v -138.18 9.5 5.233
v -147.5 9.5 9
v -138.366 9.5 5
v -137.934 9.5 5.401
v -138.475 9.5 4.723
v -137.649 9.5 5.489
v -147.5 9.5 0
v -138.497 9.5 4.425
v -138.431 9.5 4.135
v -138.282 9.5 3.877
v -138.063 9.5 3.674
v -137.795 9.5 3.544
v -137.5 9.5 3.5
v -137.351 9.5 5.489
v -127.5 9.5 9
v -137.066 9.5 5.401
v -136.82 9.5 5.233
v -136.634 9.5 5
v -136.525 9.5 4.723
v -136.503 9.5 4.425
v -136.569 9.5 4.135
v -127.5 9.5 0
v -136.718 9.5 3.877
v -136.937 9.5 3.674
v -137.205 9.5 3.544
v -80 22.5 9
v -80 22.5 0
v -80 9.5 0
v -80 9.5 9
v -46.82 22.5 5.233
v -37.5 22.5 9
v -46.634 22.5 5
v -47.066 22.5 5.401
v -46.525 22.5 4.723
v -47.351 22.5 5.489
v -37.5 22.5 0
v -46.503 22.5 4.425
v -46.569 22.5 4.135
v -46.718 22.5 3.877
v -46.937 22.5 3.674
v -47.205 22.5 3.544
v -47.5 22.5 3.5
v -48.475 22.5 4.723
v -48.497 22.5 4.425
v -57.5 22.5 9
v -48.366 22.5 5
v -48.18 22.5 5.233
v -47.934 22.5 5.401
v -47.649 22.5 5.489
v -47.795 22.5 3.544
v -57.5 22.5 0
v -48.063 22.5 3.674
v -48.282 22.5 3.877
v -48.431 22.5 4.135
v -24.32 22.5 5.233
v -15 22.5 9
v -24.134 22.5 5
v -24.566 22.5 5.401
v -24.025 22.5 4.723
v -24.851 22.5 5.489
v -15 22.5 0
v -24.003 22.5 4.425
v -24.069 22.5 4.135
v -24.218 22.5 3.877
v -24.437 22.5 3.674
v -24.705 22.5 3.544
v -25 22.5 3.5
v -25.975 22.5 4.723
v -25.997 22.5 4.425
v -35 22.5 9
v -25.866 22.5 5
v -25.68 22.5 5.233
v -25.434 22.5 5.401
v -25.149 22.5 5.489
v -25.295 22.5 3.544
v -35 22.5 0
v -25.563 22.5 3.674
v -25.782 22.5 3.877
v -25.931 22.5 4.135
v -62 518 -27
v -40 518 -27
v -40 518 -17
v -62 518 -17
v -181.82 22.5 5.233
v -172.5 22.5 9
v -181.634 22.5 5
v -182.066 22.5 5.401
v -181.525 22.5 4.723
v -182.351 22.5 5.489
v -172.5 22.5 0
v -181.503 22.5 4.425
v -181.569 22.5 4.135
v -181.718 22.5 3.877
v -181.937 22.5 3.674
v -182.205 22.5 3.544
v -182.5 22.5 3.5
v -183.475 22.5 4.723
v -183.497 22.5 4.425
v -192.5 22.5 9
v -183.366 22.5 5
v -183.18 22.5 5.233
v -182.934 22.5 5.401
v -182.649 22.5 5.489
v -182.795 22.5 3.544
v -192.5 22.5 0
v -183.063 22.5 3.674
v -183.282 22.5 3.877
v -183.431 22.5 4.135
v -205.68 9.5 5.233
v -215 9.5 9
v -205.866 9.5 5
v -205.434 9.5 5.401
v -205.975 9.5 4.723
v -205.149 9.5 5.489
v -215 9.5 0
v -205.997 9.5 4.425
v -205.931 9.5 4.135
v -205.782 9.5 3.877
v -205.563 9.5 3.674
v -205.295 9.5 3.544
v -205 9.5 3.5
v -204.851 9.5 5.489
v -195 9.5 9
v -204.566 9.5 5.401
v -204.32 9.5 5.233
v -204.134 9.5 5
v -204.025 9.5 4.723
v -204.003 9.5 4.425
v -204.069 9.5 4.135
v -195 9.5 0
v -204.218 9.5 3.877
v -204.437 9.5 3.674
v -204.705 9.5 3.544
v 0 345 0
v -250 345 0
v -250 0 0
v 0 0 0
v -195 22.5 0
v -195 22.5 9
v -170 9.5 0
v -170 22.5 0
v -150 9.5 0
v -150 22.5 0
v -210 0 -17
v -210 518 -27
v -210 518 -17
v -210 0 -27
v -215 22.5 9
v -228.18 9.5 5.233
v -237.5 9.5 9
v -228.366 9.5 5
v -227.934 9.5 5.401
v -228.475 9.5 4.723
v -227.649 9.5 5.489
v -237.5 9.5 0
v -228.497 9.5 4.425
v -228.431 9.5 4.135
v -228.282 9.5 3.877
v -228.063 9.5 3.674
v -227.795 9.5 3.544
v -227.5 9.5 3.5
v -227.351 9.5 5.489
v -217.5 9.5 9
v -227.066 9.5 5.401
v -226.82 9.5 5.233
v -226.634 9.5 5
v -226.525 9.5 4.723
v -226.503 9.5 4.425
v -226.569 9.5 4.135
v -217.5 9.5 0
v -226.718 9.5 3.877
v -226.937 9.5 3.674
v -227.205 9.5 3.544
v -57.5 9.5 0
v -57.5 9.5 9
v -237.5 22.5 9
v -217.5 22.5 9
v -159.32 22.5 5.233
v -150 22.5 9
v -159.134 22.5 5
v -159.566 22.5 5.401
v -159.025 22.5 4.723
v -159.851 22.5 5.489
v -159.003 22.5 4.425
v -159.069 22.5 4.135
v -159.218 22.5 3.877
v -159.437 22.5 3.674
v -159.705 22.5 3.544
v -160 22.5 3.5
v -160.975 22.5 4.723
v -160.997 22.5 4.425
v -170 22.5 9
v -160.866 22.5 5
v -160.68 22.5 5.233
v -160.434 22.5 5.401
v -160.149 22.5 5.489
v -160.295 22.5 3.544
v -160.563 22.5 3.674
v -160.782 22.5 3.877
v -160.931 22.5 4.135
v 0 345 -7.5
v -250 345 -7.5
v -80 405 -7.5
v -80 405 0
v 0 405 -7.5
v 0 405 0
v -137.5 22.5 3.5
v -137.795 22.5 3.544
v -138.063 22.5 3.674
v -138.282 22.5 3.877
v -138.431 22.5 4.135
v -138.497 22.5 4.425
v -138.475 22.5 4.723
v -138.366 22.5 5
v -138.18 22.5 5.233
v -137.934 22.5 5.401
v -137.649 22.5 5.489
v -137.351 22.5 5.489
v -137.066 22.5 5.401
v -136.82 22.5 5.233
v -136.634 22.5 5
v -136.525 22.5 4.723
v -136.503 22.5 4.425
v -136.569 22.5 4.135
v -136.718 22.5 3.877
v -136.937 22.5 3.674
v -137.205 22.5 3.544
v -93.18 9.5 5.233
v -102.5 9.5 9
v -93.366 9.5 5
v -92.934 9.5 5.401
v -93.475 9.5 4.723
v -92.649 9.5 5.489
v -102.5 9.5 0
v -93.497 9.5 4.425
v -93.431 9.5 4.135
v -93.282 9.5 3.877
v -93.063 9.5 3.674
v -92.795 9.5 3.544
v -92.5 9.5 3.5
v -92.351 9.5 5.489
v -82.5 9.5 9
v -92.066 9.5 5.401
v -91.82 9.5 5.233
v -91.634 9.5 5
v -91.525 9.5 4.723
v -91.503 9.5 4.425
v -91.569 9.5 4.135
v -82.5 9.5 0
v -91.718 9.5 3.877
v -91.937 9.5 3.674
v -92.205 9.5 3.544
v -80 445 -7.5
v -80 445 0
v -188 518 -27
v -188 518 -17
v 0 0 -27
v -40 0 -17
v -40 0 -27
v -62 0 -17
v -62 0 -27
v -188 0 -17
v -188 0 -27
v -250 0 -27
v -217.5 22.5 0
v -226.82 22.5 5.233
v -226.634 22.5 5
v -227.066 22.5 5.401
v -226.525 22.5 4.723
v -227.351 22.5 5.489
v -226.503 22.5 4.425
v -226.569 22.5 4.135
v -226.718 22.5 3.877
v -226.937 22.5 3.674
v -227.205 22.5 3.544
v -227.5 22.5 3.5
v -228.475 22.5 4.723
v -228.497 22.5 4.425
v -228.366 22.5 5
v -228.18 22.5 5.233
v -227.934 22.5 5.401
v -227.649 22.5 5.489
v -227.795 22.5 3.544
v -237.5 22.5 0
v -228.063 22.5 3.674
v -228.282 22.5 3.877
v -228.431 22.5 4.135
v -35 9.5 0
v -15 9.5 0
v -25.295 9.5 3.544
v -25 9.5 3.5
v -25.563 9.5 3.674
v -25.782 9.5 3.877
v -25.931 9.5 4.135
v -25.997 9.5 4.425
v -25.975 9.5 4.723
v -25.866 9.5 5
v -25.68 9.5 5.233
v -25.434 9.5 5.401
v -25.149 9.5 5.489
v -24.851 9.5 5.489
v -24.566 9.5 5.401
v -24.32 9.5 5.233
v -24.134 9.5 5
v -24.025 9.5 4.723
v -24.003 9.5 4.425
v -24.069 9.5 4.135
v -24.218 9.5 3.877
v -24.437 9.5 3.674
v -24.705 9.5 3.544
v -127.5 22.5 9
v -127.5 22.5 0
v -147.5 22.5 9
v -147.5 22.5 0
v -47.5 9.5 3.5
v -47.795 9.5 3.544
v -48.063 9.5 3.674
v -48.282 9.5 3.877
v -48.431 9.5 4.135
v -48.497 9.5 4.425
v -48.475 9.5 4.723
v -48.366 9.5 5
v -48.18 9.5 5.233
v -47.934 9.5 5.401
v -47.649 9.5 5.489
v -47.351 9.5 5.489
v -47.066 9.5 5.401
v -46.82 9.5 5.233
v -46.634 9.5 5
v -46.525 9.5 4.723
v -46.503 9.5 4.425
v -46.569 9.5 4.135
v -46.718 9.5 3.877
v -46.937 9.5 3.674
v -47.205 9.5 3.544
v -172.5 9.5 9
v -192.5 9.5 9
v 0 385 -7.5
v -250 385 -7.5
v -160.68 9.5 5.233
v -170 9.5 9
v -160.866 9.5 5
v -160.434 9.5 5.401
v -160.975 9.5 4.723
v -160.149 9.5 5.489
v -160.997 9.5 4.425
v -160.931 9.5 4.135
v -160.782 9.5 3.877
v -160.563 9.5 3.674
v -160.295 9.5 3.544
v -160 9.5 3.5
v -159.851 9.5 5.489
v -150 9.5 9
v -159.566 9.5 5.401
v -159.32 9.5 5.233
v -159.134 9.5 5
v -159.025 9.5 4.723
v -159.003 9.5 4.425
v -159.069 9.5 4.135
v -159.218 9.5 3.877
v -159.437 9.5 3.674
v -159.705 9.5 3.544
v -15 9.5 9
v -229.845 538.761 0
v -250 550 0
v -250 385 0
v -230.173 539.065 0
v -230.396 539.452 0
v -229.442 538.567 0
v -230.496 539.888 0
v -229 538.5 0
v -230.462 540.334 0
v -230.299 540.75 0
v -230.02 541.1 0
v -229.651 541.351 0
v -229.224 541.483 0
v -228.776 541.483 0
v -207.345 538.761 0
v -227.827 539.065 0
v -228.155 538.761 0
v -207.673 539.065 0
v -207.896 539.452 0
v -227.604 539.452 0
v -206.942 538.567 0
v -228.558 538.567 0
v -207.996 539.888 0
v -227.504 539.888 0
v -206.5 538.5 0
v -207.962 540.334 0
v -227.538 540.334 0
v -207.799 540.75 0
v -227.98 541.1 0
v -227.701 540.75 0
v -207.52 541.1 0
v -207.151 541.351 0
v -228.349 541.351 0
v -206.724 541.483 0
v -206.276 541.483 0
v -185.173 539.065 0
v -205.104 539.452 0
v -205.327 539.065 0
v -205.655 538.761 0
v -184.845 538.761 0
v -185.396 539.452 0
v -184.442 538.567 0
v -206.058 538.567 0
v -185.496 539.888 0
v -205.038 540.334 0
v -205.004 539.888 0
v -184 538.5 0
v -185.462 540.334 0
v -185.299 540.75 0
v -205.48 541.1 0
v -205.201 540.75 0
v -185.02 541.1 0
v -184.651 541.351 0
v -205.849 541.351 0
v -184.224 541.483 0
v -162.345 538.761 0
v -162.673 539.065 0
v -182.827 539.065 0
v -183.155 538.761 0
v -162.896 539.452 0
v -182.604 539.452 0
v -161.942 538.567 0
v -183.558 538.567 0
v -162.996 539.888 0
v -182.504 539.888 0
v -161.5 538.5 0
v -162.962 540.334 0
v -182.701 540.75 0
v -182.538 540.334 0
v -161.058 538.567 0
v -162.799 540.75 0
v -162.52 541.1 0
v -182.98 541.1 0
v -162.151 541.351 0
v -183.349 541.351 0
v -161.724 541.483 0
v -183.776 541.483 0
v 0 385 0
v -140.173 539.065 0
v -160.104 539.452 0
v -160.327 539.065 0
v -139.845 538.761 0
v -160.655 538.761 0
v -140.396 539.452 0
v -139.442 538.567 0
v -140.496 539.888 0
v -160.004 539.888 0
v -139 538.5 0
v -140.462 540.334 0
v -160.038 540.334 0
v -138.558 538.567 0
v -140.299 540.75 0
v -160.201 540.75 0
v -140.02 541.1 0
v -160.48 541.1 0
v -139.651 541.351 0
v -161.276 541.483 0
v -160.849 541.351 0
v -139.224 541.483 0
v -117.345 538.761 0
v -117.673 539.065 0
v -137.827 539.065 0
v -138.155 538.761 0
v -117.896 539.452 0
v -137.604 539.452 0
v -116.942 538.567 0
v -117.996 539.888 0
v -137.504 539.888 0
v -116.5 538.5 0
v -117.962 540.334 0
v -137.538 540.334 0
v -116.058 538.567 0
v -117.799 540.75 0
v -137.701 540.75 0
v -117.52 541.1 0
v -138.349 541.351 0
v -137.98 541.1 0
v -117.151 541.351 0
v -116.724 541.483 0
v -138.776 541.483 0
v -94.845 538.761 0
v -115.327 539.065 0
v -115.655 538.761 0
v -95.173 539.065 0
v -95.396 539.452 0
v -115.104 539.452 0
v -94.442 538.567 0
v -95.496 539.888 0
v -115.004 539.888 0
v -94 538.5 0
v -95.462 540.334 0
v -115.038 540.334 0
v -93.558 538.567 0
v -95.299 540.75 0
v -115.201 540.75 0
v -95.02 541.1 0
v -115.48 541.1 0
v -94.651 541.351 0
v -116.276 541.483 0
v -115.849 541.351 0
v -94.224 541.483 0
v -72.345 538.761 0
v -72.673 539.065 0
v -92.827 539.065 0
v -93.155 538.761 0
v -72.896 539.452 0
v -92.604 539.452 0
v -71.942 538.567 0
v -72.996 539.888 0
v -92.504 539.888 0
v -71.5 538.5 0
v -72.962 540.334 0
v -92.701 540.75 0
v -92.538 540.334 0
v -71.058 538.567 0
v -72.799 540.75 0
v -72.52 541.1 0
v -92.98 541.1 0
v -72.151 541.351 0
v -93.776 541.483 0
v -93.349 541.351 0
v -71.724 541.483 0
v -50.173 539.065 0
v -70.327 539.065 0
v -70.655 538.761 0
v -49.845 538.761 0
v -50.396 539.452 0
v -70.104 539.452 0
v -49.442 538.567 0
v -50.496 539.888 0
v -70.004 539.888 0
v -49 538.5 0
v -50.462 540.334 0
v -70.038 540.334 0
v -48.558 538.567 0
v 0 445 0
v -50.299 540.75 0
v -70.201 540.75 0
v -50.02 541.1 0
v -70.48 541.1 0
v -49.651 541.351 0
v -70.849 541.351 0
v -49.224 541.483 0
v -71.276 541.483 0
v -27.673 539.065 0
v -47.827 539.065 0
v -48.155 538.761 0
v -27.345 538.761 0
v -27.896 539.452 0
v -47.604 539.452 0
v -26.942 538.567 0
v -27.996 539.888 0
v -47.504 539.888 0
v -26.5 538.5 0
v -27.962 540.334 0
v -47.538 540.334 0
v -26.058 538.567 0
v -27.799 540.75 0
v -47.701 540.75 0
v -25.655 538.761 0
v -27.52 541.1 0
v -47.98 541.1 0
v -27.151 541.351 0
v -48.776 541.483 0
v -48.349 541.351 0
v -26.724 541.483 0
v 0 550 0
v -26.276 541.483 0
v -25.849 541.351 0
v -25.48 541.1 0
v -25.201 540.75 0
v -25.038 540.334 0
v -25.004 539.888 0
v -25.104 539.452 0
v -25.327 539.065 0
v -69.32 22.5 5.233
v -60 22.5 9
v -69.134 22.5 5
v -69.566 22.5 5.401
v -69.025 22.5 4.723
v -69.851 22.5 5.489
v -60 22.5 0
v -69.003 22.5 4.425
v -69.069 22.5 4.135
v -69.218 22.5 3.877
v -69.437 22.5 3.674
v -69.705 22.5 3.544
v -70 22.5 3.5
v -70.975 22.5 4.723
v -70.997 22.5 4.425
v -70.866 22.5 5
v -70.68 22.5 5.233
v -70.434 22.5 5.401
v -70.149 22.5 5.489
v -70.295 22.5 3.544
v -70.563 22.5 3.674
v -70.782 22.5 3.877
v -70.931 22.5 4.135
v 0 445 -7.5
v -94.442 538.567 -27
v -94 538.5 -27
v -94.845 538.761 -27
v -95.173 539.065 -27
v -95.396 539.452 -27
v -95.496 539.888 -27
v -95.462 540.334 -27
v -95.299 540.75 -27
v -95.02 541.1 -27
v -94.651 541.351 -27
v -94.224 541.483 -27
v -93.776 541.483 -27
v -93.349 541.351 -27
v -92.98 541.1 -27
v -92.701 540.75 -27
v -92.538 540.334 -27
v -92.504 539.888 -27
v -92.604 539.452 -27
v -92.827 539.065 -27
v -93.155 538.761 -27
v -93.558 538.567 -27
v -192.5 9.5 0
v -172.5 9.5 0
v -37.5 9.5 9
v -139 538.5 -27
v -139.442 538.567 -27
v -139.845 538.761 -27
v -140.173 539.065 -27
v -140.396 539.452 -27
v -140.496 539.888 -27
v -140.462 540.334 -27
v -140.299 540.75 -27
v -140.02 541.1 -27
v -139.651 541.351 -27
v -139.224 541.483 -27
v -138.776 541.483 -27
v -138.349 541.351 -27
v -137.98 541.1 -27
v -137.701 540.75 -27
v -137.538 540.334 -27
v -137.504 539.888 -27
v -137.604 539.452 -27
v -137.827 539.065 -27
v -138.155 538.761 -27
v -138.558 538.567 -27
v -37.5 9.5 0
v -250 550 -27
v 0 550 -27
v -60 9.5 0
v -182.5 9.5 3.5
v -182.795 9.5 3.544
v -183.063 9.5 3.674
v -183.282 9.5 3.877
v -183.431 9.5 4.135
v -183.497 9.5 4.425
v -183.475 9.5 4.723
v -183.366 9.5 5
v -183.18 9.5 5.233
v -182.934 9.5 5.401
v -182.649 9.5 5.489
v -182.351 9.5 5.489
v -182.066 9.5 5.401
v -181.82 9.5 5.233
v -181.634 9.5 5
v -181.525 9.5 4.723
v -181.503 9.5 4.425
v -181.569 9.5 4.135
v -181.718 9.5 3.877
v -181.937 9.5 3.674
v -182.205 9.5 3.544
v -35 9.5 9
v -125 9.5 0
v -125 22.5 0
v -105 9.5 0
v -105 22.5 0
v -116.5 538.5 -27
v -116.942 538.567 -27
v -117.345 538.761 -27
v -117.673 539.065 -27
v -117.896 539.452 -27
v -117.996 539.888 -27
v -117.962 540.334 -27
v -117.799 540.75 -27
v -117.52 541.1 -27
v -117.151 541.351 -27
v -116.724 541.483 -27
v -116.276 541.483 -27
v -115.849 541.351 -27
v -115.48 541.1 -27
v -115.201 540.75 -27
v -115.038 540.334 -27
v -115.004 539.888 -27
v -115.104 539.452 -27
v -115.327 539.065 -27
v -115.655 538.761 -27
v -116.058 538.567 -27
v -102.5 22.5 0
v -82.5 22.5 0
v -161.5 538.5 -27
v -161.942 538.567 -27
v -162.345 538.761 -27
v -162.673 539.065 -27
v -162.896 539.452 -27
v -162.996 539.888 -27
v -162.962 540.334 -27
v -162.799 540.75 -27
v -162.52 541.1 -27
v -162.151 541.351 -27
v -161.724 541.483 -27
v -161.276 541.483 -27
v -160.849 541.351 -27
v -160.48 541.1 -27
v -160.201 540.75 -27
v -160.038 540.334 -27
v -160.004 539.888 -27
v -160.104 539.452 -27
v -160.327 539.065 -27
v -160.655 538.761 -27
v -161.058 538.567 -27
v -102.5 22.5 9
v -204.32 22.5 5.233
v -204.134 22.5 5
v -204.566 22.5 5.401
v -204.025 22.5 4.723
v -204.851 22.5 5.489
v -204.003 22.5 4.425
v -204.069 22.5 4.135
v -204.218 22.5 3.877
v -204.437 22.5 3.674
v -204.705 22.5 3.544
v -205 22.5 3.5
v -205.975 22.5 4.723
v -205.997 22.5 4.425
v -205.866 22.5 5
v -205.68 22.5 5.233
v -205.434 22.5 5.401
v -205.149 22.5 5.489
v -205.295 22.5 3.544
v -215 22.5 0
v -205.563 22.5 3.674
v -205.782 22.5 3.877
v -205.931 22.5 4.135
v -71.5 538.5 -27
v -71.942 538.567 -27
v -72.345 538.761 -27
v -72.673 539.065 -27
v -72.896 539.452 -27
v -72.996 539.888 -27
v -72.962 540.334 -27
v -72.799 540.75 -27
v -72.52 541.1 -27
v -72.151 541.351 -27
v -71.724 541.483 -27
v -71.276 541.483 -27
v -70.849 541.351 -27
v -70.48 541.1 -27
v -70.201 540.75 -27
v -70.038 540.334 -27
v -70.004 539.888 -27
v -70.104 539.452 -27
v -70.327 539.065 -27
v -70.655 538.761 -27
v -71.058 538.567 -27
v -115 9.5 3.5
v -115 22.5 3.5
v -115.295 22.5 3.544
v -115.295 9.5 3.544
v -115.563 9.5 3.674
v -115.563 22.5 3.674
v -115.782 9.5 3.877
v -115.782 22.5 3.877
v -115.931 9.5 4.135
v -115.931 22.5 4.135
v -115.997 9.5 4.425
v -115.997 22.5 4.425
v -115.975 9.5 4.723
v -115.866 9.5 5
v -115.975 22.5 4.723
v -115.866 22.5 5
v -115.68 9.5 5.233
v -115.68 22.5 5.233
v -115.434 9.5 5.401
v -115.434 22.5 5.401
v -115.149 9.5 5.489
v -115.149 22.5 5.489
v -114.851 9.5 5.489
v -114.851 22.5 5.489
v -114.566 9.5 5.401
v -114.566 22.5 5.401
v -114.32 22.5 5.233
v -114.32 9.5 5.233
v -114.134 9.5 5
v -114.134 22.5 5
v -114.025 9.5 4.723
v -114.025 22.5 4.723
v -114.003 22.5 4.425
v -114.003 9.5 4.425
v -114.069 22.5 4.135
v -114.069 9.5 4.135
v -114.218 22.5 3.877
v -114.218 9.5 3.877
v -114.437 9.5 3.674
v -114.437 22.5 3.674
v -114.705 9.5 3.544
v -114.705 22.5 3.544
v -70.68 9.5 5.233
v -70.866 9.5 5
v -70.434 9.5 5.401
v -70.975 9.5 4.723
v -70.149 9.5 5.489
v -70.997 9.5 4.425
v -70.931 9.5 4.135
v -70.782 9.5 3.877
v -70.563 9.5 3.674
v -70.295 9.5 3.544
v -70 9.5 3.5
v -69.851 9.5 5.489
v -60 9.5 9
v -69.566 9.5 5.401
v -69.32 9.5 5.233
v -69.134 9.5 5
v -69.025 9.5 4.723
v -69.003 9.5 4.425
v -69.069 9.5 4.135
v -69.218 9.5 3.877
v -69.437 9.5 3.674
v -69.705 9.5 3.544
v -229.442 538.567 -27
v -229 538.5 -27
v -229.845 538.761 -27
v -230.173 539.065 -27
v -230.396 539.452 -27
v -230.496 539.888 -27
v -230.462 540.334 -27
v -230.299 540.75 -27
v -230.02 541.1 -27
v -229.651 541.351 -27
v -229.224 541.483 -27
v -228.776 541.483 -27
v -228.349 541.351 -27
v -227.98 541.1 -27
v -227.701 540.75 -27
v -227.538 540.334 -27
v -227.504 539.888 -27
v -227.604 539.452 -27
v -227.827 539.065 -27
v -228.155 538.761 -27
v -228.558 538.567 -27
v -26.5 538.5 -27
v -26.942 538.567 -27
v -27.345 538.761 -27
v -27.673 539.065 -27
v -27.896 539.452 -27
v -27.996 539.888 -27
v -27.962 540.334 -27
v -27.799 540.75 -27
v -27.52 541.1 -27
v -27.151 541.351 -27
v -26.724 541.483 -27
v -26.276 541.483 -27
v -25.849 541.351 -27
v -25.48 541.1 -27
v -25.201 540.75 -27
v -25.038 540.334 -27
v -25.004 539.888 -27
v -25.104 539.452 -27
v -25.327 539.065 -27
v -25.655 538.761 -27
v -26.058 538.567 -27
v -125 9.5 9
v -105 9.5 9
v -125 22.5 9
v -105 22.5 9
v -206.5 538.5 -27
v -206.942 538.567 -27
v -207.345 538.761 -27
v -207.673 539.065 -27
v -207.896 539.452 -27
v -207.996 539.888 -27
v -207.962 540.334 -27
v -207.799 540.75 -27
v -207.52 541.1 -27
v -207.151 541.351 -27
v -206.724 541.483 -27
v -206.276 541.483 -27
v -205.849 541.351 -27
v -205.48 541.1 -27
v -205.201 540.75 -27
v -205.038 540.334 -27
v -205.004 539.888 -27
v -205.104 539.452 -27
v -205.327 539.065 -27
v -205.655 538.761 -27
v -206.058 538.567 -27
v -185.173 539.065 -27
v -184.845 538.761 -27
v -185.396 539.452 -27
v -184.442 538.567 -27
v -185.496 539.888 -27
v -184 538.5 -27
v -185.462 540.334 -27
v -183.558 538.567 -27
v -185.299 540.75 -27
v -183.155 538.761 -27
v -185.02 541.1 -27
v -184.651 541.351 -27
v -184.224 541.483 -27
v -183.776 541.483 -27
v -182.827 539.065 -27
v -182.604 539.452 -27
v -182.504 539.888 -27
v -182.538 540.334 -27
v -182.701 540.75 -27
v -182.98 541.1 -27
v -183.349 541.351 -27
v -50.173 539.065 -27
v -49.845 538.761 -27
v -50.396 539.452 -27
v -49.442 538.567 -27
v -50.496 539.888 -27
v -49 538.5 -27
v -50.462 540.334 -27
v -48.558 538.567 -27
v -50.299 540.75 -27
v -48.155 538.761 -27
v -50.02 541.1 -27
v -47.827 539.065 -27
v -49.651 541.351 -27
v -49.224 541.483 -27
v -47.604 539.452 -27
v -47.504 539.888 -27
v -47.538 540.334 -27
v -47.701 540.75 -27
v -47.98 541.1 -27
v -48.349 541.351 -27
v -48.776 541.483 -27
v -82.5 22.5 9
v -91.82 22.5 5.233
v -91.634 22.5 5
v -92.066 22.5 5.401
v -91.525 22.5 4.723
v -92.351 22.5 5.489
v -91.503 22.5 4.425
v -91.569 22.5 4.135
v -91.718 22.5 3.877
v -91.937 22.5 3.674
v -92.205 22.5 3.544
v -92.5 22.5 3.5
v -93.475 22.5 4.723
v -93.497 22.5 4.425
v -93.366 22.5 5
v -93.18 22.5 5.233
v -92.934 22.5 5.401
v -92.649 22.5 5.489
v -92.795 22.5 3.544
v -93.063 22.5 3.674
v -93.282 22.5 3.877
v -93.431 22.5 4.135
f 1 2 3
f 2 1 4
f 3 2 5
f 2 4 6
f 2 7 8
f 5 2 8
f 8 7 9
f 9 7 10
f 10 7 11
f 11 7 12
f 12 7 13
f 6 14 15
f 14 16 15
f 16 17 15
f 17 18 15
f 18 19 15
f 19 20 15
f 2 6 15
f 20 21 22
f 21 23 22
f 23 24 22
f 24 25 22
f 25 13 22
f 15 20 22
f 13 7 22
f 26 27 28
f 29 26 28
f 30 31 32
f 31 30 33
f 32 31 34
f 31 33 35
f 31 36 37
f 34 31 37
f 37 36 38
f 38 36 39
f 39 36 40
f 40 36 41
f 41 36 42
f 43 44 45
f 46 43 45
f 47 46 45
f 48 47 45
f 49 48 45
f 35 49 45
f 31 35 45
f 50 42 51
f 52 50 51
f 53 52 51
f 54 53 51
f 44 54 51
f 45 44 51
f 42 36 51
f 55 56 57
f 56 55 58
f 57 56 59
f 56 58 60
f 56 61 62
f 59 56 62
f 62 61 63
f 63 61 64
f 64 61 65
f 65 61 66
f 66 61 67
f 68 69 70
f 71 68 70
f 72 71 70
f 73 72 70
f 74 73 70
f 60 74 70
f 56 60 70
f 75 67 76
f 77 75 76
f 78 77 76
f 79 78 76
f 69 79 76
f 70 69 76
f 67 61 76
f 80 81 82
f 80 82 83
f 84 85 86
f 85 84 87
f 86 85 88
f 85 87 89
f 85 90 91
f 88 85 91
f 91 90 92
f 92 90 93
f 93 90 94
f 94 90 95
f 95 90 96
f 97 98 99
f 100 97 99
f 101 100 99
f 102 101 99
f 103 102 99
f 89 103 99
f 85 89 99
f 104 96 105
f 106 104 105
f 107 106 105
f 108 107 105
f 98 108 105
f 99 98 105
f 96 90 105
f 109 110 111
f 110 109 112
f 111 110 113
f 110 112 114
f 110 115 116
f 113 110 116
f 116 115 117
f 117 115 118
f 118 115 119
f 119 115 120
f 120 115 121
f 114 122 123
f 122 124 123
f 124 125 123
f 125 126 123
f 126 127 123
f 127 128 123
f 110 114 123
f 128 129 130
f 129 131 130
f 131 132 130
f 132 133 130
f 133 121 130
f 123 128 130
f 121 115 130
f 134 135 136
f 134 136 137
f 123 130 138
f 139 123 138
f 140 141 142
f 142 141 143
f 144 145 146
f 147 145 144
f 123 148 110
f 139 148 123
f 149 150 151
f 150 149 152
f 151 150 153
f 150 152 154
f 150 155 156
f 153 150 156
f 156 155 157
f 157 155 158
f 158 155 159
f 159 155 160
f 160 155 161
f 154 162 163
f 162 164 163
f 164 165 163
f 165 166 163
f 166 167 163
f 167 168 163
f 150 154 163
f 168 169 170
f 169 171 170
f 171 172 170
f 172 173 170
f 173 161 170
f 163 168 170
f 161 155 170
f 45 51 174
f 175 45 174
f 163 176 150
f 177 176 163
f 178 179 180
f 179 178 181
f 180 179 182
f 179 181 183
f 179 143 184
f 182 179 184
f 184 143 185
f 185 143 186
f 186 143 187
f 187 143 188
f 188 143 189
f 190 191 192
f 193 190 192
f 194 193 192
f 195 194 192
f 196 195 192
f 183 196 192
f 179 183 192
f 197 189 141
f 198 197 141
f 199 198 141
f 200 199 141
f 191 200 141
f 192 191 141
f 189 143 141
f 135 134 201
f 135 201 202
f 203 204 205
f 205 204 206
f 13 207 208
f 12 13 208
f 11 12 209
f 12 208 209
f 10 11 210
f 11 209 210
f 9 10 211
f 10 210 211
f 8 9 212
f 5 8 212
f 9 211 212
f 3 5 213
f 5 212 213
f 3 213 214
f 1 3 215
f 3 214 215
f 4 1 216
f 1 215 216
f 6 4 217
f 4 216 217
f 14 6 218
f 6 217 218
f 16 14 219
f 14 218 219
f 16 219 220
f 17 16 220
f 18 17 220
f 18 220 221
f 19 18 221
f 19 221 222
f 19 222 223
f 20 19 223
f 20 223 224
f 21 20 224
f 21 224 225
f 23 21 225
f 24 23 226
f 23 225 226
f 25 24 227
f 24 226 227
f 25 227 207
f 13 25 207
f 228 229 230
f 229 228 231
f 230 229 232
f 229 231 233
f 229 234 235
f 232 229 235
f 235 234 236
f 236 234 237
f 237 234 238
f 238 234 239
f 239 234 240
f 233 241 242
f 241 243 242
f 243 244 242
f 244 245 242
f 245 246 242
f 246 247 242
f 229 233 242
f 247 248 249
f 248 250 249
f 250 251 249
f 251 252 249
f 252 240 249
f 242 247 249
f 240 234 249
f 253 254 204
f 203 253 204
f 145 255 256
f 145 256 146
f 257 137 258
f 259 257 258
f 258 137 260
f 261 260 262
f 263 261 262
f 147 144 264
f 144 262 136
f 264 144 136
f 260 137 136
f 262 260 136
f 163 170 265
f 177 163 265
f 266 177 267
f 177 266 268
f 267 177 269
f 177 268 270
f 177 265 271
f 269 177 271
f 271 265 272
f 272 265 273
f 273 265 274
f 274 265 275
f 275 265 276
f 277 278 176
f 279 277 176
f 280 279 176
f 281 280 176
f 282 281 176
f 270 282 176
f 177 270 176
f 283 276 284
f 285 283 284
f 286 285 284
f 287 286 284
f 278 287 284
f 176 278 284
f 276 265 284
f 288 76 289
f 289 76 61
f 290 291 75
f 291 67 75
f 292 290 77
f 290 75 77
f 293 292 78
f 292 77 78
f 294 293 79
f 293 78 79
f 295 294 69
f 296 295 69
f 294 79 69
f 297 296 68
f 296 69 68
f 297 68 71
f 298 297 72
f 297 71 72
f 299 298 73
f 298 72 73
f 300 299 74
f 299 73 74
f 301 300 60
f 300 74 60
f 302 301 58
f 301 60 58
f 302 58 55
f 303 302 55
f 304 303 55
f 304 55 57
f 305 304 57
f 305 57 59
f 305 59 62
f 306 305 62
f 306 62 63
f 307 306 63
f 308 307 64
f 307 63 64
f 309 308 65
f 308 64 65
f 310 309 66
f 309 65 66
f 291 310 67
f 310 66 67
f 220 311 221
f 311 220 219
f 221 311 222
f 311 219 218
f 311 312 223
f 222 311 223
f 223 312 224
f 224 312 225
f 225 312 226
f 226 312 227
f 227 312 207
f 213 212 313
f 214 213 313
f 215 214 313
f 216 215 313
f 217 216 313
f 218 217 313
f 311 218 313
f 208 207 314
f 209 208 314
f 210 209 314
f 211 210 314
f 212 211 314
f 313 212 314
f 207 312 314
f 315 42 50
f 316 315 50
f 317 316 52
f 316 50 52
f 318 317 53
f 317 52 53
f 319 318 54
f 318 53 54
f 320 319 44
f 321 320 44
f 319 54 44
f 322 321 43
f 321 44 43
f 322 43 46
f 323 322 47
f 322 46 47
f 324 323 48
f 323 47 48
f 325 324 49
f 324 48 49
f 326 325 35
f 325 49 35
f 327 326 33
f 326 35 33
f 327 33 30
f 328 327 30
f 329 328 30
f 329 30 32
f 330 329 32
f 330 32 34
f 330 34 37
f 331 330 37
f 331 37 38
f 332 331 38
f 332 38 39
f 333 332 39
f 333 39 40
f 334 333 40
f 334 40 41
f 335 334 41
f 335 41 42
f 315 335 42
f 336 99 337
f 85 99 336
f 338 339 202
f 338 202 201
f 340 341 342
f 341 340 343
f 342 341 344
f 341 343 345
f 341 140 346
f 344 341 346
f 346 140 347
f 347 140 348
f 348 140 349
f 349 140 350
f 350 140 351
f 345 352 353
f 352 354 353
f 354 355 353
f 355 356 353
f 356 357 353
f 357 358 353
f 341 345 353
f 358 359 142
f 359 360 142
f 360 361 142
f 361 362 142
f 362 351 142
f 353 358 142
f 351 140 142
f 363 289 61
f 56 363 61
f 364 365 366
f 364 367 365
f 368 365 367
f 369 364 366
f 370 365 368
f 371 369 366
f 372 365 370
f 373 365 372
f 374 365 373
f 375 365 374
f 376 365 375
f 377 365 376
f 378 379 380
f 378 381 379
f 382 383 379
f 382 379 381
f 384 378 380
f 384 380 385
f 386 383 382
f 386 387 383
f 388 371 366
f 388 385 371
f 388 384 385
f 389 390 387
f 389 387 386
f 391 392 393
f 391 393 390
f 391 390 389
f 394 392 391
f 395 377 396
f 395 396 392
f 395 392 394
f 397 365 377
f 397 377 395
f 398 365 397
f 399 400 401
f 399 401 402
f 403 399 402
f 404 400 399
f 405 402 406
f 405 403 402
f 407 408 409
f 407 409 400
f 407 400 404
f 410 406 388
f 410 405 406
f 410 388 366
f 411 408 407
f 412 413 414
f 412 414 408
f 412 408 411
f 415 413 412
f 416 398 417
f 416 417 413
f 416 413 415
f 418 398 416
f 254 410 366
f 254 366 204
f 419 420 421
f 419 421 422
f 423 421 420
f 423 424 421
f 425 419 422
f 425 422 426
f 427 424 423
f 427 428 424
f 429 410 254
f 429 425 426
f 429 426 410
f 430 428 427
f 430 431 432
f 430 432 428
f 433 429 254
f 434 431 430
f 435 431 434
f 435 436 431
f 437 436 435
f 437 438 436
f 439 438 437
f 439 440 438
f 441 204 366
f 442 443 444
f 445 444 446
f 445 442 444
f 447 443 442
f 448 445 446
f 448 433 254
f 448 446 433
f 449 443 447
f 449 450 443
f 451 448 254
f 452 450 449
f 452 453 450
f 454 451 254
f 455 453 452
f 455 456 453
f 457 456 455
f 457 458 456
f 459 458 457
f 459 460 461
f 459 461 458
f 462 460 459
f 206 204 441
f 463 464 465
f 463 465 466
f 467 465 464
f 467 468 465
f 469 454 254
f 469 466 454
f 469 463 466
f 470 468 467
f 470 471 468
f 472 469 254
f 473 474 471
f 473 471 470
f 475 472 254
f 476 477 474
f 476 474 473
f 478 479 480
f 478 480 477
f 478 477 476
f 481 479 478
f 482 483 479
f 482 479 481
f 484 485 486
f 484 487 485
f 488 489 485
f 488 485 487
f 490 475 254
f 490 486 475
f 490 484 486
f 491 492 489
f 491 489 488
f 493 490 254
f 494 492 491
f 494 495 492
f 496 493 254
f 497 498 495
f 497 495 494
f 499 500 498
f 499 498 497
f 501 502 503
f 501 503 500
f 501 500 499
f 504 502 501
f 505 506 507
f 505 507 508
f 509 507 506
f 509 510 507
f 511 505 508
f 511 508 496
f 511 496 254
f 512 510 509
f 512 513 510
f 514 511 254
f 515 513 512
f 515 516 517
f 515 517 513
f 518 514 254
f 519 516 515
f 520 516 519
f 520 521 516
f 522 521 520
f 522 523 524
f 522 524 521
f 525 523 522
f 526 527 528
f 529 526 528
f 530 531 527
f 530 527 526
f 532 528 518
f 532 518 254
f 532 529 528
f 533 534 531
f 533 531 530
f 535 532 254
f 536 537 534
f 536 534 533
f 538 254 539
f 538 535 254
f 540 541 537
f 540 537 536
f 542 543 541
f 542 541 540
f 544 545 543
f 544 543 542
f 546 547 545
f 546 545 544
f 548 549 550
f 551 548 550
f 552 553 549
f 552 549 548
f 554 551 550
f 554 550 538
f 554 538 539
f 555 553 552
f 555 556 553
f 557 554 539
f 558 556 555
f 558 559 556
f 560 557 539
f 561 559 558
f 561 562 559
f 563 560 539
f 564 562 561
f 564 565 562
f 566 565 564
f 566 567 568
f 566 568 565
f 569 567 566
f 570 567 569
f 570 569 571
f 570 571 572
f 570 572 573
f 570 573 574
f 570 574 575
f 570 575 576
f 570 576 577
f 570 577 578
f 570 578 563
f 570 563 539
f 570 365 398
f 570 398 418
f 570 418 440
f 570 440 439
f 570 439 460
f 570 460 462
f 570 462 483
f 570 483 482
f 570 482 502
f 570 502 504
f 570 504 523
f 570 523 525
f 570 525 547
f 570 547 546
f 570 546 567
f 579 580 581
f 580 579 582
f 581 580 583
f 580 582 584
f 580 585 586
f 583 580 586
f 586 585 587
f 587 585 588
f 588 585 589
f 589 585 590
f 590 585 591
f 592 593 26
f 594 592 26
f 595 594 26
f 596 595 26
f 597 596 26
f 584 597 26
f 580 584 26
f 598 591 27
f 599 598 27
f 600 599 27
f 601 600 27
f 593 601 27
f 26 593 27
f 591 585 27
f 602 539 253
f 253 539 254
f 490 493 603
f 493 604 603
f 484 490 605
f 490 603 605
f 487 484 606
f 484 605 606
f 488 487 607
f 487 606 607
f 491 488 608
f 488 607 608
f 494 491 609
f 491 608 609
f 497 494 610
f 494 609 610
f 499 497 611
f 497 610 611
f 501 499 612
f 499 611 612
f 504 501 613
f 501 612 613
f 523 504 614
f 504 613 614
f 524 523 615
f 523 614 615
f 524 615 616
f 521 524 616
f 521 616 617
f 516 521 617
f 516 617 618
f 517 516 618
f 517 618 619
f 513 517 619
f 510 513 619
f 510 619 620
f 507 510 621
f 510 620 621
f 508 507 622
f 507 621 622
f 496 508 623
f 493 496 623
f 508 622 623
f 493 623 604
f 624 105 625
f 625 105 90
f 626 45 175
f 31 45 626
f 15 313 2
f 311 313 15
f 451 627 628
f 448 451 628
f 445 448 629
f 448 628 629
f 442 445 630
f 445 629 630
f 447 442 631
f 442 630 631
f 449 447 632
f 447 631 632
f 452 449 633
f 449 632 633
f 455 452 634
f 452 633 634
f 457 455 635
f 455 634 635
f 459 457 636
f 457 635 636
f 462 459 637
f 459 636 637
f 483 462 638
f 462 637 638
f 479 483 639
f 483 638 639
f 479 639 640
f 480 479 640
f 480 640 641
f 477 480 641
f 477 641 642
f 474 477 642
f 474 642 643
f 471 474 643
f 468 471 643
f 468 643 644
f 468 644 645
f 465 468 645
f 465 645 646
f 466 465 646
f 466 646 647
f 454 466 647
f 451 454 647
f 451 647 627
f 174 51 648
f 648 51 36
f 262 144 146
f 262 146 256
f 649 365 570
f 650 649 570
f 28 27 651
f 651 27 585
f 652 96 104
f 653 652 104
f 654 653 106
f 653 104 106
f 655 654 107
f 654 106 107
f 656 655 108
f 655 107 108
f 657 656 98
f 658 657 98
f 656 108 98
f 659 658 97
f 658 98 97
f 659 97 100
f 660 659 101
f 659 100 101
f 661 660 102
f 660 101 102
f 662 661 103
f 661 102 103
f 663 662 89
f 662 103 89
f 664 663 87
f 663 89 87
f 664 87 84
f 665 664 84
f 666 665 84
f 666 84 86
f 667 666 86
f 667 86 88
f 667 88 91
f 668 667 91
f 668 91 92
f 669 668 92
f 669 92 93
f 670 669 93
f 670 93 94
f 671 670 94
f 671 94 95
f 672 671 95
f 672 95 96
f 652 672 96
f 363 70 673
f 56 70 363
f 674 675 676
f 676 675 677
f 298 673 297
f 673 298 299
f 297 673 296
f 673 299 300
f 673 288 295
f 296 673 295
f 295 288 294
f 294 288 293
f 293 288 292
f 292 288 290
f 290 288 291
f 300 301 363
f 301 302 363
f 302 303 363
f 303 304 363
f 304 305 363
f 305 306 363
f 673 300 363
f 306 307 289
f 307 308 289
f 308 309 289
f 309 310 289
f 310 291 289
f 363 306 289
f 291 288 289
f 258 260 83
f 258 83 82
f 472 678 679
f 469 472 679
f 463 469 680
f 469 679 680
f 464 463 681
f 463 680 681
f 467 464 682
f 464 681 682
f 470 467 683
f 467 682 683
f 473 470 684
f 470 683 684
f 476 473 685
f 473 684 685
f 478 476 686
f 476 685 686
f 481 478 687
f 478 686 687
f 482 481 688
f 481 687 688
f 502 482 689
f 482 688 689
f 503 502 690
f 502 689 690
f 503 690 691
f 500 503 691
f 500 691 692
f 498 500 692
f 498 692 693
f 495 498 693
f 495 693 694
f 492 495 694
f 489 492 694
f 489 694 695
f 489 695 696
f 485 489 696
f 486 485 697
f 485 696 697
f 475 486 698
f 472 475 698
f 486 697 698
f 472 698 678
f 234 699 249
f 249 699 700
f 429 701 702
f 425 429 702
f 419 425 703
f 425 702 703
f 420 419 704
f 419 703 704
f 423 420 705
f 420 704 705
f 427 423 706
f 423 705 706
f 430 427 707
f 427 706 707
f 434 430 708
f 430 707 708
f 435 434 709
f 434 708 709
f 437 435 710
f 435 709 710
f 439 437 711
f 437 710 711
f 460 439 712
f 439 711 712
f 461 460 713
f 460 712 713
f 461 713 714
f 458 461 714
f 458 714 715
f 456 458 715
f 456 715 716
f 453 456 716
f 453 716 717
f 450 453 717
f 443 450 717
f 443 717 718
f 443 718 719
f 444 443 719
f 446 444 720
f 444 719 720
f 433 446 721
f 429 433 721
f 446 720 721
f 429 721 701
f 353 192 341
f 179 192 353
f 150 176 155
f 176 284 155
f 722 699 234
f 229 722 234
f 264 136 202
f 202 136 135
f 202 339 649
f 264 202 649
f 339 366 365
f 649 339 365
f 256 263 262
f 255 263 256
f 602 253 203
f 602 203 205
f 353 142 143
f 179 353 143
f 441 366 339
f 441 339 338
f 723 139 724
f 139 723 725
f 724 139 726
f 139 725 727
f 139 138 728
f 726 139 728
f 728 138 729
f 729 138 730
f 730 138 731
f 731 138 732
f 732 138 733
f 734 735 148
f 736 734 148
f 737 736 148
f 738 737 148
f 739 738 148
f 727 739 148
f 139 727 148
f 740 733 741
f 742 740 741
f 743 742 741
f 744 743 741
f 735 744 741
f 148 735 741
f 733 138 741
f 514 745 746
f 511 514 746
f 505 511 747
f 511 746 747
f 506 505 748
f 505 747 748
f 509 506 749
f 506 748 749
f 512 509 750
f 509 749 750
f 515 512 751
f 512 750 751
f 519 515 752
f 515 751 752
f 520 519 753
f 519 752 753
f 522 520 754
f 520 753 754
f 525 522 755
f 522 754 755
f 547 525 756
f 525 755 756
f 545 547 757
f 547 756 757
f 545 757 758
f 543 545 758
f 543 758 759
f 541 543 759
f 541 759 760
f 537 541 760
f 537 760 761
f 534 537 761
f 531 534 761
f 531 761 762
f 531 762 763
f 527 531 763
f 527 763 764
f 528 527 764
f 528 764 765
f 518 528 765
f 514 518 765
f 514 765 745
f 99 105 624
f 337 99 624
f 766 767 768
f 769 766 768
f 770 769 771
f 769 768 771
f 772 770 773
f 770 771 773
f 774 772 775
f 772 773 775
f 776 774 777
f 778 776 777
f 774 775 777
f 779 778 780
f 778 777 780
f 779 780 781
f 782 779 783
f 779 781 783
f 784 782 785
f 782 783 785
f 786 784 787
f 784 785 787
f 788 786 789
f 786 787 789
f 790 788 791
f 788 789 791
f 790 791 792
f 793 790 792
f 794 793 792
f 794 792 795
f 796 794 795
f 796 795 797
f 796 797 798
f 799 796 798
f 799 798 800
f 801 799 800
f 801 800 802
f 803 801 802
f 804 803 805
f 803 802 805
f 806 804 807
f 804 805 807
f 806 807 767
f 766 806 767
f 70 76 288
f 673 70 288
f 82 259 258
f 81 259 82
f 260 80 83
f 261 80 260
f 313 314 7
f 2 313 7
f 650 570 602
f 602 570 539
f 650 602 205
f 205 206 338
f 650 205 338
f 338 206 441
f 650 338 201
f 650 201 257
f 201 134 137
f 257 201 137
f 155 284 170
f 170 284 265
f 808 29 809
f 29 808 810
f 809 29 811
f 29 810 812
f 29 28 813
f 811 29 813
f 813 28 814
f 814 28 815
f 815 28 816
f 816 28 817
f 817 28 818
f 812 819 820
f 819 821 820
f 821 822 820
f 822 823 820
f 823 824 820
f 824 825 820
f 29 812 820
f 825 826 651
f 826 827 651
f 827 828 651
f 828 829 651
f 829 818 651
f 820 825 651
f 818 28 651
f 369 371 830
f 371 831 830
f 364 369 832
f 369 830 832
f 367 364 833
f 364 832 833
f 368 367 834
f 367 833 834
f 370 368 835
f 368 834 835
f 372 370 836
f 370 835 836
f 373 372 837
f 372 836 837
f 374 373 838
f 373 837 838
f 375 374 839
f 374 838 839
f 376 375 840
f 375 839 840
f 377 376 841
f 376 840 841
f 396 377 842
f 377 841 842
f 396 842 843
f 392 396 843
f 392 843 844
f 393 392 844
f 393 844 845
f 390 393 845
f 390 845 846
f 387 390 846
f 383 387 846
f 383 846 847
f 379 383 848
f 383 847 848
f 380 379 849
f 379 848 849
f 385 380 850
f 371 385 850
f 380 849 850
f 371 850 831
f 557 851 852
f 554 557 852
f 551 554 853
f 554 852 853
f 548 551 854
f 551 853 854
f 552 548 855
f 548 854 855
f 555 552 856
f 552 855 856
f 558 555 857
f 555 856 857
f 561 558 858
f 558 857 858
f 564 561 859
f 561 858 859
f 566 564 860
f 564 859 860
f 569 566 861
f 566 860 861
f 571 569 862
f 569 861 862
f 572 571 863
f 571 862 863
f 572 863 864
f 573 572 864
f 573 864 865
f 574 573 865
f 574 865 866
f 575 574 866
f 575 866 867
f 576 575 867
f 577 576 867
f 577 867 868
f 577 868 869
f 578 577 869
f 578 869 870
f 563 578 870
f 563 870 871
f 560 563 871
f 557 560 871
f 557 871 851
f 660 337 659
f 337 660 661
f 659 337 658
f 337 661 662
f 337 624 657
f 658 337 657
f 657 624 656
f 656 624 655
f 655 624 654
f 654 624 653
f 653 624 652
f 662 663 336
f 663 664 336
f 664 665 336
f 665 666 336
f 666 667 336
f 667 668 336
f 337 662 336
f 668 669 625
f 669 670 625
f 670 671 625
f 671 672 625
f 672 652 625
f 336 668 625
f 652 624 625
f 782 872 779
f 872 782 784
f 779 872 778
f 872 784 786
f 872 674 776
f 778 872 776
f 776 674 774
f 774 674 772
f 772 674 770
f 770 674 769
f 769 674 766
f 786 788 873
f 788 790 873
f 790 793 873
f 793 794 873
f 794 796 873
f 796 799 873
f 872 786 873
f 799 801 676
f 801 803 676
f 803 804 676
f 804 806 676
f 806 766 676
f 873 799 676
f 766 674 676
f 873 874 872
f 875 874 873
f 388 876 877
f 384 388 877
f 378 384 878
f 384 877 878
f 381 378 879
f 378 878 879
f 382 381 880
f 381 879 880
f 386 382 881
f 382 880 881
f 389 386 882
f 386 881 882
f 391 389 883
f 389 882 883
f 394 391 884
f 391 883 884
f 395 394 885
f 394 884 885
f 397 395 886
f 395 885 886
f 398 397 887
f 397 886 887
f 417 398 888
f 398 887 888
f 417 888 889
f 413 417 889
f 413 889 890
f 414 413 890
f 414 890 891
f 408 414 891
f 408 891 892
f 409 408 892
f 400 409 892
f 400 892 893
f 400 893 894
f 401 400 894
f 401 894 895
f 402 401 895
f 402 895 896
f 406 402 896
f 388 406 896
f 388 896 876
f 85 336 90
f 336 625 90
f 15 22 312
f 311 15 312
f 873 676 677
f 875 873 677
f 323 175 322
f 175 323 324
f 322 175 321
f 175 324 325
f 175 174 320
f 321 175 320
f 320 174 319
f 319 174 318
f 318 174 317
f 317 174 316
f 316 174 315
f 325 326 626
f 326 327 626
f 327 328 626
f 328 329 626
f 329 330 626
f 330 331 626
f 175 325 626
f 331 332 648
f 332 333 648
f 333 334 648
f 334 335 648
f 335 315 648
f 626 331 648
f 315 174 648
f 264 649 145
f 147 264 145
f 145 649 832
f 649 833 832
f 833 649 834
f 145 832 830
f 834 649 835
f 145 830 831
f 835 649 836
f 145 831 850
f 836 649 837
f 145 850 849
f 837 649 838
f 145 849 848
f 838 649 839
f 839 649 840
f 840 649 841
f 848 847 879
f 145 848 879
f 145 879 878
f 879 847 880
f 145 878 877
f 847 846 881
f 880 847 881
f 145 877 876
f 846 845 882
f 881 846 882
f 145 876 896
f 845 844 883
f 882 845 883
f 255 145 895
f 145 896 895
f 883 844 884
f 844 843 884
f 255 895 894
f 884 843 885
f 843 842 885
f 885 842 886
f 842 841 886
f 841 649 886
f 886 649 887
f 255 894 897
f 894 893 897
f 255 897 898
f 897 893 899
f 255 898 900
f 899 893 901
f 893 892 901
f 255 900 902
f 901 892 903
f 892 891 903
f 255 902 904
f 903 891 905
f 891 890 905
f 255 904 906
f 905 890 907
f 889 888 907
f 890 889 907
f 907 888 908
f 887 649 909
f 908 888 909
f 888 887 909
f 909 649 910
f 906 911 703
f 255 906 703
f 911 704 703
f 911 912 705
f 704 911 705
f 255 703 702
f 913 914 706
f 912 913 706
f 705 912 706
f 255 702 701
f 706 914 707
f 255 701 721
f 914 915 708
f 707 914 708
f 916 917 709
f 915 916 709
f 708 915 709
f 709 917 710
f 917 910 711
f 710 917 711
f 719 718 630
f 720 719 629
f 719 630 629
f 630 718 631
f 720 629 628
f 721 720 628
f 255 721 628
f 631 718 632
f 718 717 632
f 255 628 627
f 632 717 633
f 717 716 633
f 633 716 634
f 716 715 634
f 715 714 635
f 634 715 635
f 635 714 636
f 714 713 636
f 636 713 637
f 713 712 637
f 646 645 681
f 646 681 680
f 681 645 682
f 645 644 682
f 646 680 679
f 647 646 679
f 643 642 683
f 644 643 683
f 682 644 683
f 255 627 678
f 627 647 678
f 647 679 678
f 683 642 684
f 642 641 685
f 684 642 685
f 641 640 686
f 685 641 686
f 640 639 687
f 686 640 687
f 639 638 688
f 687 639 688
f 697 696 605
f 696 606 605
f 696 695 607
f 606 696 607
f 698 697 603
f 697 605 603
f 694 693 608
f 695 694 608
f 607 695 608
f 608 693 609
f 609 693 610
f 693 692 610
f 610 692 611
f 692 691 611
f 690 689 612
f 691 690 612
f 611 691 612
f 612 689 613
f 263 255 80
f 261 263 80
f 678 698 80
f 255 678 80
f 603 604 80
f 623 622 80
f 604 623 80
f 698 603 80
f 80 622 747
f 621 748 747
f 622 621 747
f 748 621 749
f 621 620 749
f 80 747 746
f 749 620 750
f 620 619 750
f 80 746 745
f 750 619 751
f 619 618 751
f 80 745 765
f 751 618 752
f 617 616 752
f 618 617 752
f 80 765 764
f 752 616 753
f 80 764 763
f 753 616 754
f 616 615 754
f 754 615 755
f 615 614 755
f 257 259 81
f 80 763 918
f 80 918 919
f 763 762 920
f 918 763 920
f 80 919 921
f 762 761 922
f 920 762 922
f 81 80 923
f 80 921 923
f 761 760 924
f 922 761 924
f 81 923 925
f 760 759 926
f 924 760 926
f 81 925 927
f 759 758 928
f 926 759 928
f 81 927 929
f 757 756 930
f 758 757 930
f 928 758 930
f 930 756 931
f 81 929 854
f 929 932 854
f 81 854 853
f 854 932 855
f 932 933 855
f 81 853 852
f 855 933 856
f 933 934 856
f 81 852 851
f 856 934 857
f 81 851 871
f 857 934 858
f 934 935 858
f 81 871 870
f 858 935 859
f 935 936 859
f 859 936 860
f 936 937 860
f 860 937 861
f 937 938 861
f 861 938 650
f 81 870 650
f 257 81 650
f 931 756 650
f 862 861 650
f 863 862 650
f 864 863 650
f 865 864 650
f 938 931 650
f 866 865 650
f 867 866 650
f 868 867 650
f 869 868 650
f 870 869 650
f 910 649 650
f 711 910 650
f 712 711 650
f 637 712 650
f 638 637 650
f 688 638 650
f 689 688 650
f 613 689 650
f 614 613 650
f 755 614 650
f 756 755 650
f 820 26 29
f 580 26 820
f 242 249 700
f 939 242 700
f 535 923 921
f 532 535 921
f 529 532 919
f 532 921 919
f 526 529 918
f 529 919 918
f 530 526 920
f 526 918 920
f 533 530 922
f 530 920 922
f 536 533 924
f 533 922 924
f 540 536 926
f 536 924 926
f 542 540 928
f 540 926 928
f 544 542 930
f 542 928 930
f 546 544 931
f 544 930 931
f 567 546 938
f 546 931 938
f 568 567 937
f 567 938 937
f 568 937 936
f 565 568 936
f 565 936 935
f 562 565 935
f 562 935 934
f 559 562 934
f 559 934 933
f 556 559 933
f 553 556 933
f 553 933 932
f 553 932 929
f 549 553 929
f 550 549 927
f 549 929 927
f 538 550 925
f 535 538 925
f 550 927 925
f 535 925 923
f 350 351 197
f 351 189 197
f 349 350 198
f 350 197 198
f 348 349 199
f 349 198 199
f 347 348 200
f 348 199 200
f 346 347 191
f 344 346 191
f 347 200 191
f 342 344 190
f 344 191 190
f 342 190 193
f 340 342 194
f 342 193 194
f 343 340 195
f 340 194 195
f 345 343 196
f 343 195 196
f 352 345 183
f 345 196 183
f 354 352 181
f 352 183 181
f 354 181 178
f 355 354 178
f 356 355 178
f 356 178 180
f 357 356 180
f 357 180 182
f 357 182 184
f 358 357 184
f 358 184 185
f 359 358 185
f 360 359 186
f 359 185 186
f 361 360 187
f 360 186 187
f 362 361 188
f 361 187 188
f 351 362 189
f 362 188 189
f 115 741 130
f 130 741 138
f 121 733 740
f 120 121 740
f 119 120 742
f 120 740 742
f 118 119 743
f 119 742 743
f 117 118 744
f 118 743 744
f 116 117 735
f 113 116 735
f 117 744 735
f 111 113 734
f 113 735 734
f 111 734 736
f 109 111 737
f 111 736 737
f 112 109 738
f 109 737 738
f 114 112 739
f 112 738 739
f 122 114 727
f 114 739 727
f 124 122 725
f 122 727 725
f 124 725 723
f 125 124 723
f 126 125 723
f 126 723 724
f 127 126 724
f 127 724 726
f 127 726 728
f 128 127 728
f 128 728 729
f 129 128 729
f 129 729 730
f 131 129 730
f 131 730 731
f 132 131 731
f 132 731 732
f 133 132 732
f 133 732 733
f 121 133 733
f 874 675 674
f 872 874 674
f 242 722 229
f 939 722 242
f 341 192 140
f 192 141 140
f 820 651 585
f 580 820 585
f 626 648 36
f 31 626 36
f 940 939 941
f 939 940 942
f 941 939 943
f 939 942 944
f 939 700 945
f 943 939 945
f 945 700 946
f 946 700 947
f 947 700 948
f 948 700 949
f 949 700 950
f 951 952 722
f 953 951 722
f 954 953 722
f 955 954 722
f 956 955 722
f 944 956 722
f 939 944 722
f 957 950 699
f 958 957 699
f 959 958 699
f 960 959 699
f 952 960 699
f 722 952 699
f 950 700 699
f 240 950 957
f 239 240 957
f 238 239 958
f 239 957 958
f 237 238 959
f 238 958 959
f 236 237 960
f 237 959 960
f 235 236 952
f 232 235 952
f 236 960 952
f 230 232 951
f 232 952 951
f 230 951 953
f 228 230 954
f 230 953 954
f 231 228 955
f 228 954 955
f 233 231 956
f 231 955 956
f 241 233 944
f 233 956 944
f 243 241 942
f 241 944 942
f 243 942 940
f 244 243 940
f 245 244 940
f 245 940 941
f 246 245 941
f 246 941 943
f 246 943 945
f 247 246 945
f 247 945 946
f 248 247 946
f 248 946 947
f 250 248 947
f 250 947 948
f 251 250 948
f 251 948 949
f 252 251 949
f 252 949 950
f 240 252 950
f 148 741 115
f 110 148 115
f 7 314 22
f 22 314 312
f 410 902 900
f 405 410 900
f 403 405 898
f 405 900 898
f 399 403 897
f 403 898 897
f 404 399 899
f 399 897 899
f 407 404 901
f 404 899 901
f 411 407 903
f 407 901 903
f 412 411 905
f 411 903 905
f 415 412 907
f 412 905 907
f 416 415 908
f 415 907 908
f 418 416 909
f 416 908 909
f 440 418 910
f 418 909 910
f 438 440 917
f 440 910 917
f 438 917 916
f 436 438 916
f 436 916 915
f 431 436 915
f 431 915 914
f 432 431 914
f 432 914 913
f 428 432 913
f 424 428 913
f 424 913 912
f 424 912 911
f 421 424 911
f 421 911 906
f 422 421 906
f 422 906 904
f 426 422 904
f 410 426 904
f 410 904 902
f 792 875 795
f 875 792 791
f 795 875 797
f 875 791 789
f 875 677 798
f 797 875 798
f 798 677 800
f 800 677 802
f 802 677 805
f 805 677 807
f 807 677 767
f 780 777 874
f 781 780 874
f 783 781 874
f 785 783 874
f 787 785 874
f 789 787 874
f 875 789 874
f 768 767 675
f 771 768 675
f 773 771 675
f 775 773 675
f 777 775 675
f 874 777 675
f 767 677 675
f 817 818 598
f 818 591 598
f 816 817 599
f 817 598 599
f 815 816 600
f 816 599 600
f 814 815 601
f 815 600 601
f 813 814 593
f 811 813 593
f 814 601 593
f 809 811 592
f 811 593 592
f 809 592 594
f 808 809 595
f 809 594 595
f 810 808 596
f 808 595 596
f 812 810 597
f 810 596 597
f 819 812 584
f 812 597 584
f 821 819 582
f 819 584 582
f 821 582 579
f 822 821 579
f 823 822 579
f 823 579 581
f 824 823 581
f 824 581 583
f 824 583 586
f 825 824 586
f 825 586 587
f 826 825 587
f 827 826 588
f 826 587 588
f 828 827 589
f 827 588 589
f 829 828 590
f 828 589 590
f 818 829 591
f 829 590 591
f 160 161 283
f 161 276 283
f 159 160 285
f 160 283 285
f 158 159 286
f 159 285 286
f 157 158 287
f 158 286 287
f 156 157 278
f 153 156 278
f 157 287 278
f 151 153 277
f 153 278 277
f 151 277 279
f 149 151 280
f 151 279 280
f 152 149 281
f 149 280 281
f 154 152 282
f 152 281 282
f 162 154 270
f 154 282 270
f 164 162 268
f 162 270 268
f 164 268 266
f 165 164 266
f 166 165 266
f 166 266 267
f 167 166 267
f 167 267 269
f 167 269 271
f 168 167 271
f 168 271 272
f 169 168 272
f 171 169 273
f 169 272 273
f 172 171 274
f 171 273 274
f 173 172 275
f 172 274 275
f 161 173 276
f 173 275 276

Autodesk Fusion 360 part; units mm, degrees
sketch "Sketch1" plane through (0, 0, 0) normal (0, 0, 1) x (1, 0, 0)
  line L0 (0, 0) -> (-250, 0)
  line L1 (-250, 0) -> (-250, 550)
  line L2 (-250, 550) -> (0, 550)
  line L3 (0, 550) -> (0, 0)
  line L4 (-250, 385) -> (0, 385)
  line L5 (0, 385) -> (0, 345)
  line L6 (0, 345) -> (-250, 345)
  line L7 (-250, 345) -> (-250, 385)
  line L8 (-250, 60) -> (0, 60)
  line L9 (0, 60) -> (0, 50)
  line L10 (0, 50) -> (-250, 50)
  line L11 (-250, 50) -> (-250, 60)
  line L12 (-250, 510) -> (0, 510)
  line L13 (0, 510) -> (0, 500)
  line L14 (0, 500) -> (-250, 500)
  line L15 (-250, 500) -> (-250, 510)
  line L16 (-250, 84.695) -> (0, 84.695) construction
  line L17 (-250, 108.004) -> (0, 108.004) construction
  line L18 (-250, 130.005) -> (0, 130.005) construction
  line L19 (-250, 150.771) -> (0, 150.771) construction
  line L20 (-250, 170.372) -> (0, 170.372) construction
  line L21 (-250, 188.873) -> (0, 188.873) construction
  line L22 (-250, 206.335) -> (0, 206.335) construction
  line L23 (-250, 222.817) -> (0, 222.817) construction
  line L24 (-250, 238.374) -> (0, 238.374) construction
  line L25 (-250, 253.058) -> (0, 253.058) construction
  line L26 (-250, 266.918) -> (0, 266.918) construction
  line L27 (0, 445) -> (-80, 445)
  line L28 (-80, 445) -> (-80, 405)
  line L29 (-80, 405) -> (0, 405)
  line L30 (0, 405) -> (0, 445)
  point P0 (-229, 540)
  point P1 (-206.5, 540)
  point P2 (-184, 540)
  point P3 (-161.5, 540)
  point P4 (-139, 540)
  point P5 (-116.5, 540)
  point P6 (-94, 540)
  point P7 (-71.5, 540)
  point P8 (-49, 540)
  point P9 (-26.5, 540)
  dimension "d1" = 250
  dimension "d2" = 550
  dimension "d3" = 21
  dimension "d6" = 22.5
  dimension "d7" = -525
  dimension "d41" = 10
  dimension "d42" = 165
  dimension "d43" = 40
  dimension "d44" = 60
  dimension "d45" = 10
  dimension "d46" = 40
  dimension "d47" = 10
  dimension "d48" = 24.695
  dimension "d49" = 23.309
  dimension "d50" = 22.001
  dimension "d51" = 20.766
  dimension "d52" = 19.601
  dimension "d53" = 18.501
  dimension "d54" = 17.462
  dimension "d55" = 16.482
  dimension "d56" = 15.557
  dimension "d57" = 14.684
  dimension "d58" = 13.86
  dimension "d60" = 20
  dimension "d61" = 40
  dimension "d62" = 80
extrude "Extrude1" add sketch "Sketch1" against normal blind 27 makes body 1
extrude "Extrude5" cut sketch "Sketch1" against normal blind 7.5 contours L1 L3 L4 L5 L6 L7 | L3 L27 L28 L29 L30 bodies 1
hole "Hole2" at (-229, 540, 0) at (-206.5, 540, 0) at (-184, 540, 0) at (-161.5, 540, 0) at (-139, 540, 0) at (-116.5, 540, 0) at (-94, 540, 0) at (-71.5, 540, 0) at (-49, 540, 0) at (-26.5, 540, 0) direction (0, 0, -1) diameter 3 depth 1000 tip angle 118 bodies 1
sketch "Sketch1 (2)" plane through (0, 0, 0) normal (0, 0, 1) x (1, 0, 0) in component "bridge piece"
  line L0 (0, 0) -> (20, 0)
  line L1 (20, 0) -> (20, 13)
  line L2 (20, 13) -> (0, 13)
  line L3 (0, 13) -> (0, 0)
  dimension "d69" = 20
  dimension "d70" = 13
extrude "Extrude1'" add sketch "Sketch1 (2)" along normal blind 9 separate body makes body 2 in component "bridge piece"
sketch "Sketch2" plane through (0, 0, 0) normal (0, -1, 0) x (1, 0, 0) in component "bridge piece"
  line L0 (0, 0) -> (20, 0)
  line L1 (20, 0) -> (20, 9)
  line L2 (20, 9) -> (0, 9)
  line L3 (0, 9) -> (0, 0)
  point P0 (10, 4.5)
  dimension "d73" = 4.5
  dimension "d74" = 10
hole "Hole1" at (10, 0, 4.5) direction (0, 1, 0) diameter 2 depth 100 tip angle 118 bodies 2 in component "bridge piece"
sketch "Sketch4" plane through (0, 0, 0) normal (0, 0, 1) x (1, 0, 0)
  line L0 (-227.5, 540) -> (-227.5, 16) construction
  circle A0 centre (-229, 540) radius 1.5
  point P0 (-227.5, 16)
  point P1 (-205, 16)
  point P2 (-182.5, 16)
  point P3 (-160, 16)
  point P4 (-137.5, 16)
  point P5 (-115, 16)
  point P6 (-92.5, 16)
  point P7 (-70, 16)
  point P8 (-47.5, 16)
  point P9 (-25, 16)
  dimension "d78" = 524
  dimension "d81" = 22.5
  dimension "d82" = 0
pattern_linear "R-Pattern1" count 10 spacing 22.5 along (1, 0, 0) of bodies 2 makes body 3 at (29.1667, 8.6667, 0) makes body 4 at (51.6667, 8.6667, 0) makes body 5 at (74.1667, 8.6667, 0) makes body 6 at (96.6667, 8.6667, 0) makes body 7 at (119.1667, 8.6667, 0) makes body 8 at (141.6667, 8.6667, 0) makes body 9 at (164.1667, 8.6667, 0) makes body 10 at (186.6667, 8.6667, 0) makes body 11 at (209.1667, 8.6667, 0) in component "bridge piece"
sketch "Sketch5" plane through (0, 0, -27) normal (0, 0, -1) x (1, 0, 0)
  circle A0 centre (-49, -540) radius 1.5
  circle A1 centre (-94, -540) radius 1.5
  circle A2 centre (-139, -540) radius 1.5
  circle A3 centre (-184, -540) radius 1.5
  circle A4 centre (-229, -540) radius 1.5
  circle A5 centre (-206.5, -540) radius 1.5
  circle A6 centre (-161.5, -540) radius 1.5
  circle A7 centre (-116.5, -540) radius 1.5
  circle A8 centre (-71.5, -540) radius 1.5
  circle A9 centre (-26.5, -540) radius 1.5
  line L0 (0, -550) -> (0, 0)
  line L1 (0, 0) -> (-250, 0)
  line L2 (-250, 0) -> (-250, -550)
  line L3 (-250, -550) -> (0, -550)
  line L4 (-210, 0) -> (-188, 0)
  line L5 (-188, 0) -> (-188, -518)
  line L6 (-188, -518) -> (-210, -518)
  line L7 (-210, -518) -> (-210, 0)
  line L8 (-62, 0) -> (-40, 0)
  line L9 (-40, 0) -> (-40, -518)
  line L10 (-40, -518) -> (-62, -518)
  line L11 (-62, -518) -> (-62, 0)
  dimension "d87" = 40
  dimension "d88" = 22
  dimension "d89" = 518
  dimension "d90" = 40
extrude "Extrude6" cut sketch "Sketch5" against normal blind 10 contours L1 L8 L9 L10 L11 | L1 L4 L5 L6 L7 bodies 1
component "bridge piece" placed x (1, 0, 0) y (0, 1, 0) z (0, 0, 1) at (-237.5, 9.5, 0)
component "Component" placed x (1, 0, 0) y (0, 1, 0) z (0, 0, 1) at (0, 0, 0) in component "bridge piece"
